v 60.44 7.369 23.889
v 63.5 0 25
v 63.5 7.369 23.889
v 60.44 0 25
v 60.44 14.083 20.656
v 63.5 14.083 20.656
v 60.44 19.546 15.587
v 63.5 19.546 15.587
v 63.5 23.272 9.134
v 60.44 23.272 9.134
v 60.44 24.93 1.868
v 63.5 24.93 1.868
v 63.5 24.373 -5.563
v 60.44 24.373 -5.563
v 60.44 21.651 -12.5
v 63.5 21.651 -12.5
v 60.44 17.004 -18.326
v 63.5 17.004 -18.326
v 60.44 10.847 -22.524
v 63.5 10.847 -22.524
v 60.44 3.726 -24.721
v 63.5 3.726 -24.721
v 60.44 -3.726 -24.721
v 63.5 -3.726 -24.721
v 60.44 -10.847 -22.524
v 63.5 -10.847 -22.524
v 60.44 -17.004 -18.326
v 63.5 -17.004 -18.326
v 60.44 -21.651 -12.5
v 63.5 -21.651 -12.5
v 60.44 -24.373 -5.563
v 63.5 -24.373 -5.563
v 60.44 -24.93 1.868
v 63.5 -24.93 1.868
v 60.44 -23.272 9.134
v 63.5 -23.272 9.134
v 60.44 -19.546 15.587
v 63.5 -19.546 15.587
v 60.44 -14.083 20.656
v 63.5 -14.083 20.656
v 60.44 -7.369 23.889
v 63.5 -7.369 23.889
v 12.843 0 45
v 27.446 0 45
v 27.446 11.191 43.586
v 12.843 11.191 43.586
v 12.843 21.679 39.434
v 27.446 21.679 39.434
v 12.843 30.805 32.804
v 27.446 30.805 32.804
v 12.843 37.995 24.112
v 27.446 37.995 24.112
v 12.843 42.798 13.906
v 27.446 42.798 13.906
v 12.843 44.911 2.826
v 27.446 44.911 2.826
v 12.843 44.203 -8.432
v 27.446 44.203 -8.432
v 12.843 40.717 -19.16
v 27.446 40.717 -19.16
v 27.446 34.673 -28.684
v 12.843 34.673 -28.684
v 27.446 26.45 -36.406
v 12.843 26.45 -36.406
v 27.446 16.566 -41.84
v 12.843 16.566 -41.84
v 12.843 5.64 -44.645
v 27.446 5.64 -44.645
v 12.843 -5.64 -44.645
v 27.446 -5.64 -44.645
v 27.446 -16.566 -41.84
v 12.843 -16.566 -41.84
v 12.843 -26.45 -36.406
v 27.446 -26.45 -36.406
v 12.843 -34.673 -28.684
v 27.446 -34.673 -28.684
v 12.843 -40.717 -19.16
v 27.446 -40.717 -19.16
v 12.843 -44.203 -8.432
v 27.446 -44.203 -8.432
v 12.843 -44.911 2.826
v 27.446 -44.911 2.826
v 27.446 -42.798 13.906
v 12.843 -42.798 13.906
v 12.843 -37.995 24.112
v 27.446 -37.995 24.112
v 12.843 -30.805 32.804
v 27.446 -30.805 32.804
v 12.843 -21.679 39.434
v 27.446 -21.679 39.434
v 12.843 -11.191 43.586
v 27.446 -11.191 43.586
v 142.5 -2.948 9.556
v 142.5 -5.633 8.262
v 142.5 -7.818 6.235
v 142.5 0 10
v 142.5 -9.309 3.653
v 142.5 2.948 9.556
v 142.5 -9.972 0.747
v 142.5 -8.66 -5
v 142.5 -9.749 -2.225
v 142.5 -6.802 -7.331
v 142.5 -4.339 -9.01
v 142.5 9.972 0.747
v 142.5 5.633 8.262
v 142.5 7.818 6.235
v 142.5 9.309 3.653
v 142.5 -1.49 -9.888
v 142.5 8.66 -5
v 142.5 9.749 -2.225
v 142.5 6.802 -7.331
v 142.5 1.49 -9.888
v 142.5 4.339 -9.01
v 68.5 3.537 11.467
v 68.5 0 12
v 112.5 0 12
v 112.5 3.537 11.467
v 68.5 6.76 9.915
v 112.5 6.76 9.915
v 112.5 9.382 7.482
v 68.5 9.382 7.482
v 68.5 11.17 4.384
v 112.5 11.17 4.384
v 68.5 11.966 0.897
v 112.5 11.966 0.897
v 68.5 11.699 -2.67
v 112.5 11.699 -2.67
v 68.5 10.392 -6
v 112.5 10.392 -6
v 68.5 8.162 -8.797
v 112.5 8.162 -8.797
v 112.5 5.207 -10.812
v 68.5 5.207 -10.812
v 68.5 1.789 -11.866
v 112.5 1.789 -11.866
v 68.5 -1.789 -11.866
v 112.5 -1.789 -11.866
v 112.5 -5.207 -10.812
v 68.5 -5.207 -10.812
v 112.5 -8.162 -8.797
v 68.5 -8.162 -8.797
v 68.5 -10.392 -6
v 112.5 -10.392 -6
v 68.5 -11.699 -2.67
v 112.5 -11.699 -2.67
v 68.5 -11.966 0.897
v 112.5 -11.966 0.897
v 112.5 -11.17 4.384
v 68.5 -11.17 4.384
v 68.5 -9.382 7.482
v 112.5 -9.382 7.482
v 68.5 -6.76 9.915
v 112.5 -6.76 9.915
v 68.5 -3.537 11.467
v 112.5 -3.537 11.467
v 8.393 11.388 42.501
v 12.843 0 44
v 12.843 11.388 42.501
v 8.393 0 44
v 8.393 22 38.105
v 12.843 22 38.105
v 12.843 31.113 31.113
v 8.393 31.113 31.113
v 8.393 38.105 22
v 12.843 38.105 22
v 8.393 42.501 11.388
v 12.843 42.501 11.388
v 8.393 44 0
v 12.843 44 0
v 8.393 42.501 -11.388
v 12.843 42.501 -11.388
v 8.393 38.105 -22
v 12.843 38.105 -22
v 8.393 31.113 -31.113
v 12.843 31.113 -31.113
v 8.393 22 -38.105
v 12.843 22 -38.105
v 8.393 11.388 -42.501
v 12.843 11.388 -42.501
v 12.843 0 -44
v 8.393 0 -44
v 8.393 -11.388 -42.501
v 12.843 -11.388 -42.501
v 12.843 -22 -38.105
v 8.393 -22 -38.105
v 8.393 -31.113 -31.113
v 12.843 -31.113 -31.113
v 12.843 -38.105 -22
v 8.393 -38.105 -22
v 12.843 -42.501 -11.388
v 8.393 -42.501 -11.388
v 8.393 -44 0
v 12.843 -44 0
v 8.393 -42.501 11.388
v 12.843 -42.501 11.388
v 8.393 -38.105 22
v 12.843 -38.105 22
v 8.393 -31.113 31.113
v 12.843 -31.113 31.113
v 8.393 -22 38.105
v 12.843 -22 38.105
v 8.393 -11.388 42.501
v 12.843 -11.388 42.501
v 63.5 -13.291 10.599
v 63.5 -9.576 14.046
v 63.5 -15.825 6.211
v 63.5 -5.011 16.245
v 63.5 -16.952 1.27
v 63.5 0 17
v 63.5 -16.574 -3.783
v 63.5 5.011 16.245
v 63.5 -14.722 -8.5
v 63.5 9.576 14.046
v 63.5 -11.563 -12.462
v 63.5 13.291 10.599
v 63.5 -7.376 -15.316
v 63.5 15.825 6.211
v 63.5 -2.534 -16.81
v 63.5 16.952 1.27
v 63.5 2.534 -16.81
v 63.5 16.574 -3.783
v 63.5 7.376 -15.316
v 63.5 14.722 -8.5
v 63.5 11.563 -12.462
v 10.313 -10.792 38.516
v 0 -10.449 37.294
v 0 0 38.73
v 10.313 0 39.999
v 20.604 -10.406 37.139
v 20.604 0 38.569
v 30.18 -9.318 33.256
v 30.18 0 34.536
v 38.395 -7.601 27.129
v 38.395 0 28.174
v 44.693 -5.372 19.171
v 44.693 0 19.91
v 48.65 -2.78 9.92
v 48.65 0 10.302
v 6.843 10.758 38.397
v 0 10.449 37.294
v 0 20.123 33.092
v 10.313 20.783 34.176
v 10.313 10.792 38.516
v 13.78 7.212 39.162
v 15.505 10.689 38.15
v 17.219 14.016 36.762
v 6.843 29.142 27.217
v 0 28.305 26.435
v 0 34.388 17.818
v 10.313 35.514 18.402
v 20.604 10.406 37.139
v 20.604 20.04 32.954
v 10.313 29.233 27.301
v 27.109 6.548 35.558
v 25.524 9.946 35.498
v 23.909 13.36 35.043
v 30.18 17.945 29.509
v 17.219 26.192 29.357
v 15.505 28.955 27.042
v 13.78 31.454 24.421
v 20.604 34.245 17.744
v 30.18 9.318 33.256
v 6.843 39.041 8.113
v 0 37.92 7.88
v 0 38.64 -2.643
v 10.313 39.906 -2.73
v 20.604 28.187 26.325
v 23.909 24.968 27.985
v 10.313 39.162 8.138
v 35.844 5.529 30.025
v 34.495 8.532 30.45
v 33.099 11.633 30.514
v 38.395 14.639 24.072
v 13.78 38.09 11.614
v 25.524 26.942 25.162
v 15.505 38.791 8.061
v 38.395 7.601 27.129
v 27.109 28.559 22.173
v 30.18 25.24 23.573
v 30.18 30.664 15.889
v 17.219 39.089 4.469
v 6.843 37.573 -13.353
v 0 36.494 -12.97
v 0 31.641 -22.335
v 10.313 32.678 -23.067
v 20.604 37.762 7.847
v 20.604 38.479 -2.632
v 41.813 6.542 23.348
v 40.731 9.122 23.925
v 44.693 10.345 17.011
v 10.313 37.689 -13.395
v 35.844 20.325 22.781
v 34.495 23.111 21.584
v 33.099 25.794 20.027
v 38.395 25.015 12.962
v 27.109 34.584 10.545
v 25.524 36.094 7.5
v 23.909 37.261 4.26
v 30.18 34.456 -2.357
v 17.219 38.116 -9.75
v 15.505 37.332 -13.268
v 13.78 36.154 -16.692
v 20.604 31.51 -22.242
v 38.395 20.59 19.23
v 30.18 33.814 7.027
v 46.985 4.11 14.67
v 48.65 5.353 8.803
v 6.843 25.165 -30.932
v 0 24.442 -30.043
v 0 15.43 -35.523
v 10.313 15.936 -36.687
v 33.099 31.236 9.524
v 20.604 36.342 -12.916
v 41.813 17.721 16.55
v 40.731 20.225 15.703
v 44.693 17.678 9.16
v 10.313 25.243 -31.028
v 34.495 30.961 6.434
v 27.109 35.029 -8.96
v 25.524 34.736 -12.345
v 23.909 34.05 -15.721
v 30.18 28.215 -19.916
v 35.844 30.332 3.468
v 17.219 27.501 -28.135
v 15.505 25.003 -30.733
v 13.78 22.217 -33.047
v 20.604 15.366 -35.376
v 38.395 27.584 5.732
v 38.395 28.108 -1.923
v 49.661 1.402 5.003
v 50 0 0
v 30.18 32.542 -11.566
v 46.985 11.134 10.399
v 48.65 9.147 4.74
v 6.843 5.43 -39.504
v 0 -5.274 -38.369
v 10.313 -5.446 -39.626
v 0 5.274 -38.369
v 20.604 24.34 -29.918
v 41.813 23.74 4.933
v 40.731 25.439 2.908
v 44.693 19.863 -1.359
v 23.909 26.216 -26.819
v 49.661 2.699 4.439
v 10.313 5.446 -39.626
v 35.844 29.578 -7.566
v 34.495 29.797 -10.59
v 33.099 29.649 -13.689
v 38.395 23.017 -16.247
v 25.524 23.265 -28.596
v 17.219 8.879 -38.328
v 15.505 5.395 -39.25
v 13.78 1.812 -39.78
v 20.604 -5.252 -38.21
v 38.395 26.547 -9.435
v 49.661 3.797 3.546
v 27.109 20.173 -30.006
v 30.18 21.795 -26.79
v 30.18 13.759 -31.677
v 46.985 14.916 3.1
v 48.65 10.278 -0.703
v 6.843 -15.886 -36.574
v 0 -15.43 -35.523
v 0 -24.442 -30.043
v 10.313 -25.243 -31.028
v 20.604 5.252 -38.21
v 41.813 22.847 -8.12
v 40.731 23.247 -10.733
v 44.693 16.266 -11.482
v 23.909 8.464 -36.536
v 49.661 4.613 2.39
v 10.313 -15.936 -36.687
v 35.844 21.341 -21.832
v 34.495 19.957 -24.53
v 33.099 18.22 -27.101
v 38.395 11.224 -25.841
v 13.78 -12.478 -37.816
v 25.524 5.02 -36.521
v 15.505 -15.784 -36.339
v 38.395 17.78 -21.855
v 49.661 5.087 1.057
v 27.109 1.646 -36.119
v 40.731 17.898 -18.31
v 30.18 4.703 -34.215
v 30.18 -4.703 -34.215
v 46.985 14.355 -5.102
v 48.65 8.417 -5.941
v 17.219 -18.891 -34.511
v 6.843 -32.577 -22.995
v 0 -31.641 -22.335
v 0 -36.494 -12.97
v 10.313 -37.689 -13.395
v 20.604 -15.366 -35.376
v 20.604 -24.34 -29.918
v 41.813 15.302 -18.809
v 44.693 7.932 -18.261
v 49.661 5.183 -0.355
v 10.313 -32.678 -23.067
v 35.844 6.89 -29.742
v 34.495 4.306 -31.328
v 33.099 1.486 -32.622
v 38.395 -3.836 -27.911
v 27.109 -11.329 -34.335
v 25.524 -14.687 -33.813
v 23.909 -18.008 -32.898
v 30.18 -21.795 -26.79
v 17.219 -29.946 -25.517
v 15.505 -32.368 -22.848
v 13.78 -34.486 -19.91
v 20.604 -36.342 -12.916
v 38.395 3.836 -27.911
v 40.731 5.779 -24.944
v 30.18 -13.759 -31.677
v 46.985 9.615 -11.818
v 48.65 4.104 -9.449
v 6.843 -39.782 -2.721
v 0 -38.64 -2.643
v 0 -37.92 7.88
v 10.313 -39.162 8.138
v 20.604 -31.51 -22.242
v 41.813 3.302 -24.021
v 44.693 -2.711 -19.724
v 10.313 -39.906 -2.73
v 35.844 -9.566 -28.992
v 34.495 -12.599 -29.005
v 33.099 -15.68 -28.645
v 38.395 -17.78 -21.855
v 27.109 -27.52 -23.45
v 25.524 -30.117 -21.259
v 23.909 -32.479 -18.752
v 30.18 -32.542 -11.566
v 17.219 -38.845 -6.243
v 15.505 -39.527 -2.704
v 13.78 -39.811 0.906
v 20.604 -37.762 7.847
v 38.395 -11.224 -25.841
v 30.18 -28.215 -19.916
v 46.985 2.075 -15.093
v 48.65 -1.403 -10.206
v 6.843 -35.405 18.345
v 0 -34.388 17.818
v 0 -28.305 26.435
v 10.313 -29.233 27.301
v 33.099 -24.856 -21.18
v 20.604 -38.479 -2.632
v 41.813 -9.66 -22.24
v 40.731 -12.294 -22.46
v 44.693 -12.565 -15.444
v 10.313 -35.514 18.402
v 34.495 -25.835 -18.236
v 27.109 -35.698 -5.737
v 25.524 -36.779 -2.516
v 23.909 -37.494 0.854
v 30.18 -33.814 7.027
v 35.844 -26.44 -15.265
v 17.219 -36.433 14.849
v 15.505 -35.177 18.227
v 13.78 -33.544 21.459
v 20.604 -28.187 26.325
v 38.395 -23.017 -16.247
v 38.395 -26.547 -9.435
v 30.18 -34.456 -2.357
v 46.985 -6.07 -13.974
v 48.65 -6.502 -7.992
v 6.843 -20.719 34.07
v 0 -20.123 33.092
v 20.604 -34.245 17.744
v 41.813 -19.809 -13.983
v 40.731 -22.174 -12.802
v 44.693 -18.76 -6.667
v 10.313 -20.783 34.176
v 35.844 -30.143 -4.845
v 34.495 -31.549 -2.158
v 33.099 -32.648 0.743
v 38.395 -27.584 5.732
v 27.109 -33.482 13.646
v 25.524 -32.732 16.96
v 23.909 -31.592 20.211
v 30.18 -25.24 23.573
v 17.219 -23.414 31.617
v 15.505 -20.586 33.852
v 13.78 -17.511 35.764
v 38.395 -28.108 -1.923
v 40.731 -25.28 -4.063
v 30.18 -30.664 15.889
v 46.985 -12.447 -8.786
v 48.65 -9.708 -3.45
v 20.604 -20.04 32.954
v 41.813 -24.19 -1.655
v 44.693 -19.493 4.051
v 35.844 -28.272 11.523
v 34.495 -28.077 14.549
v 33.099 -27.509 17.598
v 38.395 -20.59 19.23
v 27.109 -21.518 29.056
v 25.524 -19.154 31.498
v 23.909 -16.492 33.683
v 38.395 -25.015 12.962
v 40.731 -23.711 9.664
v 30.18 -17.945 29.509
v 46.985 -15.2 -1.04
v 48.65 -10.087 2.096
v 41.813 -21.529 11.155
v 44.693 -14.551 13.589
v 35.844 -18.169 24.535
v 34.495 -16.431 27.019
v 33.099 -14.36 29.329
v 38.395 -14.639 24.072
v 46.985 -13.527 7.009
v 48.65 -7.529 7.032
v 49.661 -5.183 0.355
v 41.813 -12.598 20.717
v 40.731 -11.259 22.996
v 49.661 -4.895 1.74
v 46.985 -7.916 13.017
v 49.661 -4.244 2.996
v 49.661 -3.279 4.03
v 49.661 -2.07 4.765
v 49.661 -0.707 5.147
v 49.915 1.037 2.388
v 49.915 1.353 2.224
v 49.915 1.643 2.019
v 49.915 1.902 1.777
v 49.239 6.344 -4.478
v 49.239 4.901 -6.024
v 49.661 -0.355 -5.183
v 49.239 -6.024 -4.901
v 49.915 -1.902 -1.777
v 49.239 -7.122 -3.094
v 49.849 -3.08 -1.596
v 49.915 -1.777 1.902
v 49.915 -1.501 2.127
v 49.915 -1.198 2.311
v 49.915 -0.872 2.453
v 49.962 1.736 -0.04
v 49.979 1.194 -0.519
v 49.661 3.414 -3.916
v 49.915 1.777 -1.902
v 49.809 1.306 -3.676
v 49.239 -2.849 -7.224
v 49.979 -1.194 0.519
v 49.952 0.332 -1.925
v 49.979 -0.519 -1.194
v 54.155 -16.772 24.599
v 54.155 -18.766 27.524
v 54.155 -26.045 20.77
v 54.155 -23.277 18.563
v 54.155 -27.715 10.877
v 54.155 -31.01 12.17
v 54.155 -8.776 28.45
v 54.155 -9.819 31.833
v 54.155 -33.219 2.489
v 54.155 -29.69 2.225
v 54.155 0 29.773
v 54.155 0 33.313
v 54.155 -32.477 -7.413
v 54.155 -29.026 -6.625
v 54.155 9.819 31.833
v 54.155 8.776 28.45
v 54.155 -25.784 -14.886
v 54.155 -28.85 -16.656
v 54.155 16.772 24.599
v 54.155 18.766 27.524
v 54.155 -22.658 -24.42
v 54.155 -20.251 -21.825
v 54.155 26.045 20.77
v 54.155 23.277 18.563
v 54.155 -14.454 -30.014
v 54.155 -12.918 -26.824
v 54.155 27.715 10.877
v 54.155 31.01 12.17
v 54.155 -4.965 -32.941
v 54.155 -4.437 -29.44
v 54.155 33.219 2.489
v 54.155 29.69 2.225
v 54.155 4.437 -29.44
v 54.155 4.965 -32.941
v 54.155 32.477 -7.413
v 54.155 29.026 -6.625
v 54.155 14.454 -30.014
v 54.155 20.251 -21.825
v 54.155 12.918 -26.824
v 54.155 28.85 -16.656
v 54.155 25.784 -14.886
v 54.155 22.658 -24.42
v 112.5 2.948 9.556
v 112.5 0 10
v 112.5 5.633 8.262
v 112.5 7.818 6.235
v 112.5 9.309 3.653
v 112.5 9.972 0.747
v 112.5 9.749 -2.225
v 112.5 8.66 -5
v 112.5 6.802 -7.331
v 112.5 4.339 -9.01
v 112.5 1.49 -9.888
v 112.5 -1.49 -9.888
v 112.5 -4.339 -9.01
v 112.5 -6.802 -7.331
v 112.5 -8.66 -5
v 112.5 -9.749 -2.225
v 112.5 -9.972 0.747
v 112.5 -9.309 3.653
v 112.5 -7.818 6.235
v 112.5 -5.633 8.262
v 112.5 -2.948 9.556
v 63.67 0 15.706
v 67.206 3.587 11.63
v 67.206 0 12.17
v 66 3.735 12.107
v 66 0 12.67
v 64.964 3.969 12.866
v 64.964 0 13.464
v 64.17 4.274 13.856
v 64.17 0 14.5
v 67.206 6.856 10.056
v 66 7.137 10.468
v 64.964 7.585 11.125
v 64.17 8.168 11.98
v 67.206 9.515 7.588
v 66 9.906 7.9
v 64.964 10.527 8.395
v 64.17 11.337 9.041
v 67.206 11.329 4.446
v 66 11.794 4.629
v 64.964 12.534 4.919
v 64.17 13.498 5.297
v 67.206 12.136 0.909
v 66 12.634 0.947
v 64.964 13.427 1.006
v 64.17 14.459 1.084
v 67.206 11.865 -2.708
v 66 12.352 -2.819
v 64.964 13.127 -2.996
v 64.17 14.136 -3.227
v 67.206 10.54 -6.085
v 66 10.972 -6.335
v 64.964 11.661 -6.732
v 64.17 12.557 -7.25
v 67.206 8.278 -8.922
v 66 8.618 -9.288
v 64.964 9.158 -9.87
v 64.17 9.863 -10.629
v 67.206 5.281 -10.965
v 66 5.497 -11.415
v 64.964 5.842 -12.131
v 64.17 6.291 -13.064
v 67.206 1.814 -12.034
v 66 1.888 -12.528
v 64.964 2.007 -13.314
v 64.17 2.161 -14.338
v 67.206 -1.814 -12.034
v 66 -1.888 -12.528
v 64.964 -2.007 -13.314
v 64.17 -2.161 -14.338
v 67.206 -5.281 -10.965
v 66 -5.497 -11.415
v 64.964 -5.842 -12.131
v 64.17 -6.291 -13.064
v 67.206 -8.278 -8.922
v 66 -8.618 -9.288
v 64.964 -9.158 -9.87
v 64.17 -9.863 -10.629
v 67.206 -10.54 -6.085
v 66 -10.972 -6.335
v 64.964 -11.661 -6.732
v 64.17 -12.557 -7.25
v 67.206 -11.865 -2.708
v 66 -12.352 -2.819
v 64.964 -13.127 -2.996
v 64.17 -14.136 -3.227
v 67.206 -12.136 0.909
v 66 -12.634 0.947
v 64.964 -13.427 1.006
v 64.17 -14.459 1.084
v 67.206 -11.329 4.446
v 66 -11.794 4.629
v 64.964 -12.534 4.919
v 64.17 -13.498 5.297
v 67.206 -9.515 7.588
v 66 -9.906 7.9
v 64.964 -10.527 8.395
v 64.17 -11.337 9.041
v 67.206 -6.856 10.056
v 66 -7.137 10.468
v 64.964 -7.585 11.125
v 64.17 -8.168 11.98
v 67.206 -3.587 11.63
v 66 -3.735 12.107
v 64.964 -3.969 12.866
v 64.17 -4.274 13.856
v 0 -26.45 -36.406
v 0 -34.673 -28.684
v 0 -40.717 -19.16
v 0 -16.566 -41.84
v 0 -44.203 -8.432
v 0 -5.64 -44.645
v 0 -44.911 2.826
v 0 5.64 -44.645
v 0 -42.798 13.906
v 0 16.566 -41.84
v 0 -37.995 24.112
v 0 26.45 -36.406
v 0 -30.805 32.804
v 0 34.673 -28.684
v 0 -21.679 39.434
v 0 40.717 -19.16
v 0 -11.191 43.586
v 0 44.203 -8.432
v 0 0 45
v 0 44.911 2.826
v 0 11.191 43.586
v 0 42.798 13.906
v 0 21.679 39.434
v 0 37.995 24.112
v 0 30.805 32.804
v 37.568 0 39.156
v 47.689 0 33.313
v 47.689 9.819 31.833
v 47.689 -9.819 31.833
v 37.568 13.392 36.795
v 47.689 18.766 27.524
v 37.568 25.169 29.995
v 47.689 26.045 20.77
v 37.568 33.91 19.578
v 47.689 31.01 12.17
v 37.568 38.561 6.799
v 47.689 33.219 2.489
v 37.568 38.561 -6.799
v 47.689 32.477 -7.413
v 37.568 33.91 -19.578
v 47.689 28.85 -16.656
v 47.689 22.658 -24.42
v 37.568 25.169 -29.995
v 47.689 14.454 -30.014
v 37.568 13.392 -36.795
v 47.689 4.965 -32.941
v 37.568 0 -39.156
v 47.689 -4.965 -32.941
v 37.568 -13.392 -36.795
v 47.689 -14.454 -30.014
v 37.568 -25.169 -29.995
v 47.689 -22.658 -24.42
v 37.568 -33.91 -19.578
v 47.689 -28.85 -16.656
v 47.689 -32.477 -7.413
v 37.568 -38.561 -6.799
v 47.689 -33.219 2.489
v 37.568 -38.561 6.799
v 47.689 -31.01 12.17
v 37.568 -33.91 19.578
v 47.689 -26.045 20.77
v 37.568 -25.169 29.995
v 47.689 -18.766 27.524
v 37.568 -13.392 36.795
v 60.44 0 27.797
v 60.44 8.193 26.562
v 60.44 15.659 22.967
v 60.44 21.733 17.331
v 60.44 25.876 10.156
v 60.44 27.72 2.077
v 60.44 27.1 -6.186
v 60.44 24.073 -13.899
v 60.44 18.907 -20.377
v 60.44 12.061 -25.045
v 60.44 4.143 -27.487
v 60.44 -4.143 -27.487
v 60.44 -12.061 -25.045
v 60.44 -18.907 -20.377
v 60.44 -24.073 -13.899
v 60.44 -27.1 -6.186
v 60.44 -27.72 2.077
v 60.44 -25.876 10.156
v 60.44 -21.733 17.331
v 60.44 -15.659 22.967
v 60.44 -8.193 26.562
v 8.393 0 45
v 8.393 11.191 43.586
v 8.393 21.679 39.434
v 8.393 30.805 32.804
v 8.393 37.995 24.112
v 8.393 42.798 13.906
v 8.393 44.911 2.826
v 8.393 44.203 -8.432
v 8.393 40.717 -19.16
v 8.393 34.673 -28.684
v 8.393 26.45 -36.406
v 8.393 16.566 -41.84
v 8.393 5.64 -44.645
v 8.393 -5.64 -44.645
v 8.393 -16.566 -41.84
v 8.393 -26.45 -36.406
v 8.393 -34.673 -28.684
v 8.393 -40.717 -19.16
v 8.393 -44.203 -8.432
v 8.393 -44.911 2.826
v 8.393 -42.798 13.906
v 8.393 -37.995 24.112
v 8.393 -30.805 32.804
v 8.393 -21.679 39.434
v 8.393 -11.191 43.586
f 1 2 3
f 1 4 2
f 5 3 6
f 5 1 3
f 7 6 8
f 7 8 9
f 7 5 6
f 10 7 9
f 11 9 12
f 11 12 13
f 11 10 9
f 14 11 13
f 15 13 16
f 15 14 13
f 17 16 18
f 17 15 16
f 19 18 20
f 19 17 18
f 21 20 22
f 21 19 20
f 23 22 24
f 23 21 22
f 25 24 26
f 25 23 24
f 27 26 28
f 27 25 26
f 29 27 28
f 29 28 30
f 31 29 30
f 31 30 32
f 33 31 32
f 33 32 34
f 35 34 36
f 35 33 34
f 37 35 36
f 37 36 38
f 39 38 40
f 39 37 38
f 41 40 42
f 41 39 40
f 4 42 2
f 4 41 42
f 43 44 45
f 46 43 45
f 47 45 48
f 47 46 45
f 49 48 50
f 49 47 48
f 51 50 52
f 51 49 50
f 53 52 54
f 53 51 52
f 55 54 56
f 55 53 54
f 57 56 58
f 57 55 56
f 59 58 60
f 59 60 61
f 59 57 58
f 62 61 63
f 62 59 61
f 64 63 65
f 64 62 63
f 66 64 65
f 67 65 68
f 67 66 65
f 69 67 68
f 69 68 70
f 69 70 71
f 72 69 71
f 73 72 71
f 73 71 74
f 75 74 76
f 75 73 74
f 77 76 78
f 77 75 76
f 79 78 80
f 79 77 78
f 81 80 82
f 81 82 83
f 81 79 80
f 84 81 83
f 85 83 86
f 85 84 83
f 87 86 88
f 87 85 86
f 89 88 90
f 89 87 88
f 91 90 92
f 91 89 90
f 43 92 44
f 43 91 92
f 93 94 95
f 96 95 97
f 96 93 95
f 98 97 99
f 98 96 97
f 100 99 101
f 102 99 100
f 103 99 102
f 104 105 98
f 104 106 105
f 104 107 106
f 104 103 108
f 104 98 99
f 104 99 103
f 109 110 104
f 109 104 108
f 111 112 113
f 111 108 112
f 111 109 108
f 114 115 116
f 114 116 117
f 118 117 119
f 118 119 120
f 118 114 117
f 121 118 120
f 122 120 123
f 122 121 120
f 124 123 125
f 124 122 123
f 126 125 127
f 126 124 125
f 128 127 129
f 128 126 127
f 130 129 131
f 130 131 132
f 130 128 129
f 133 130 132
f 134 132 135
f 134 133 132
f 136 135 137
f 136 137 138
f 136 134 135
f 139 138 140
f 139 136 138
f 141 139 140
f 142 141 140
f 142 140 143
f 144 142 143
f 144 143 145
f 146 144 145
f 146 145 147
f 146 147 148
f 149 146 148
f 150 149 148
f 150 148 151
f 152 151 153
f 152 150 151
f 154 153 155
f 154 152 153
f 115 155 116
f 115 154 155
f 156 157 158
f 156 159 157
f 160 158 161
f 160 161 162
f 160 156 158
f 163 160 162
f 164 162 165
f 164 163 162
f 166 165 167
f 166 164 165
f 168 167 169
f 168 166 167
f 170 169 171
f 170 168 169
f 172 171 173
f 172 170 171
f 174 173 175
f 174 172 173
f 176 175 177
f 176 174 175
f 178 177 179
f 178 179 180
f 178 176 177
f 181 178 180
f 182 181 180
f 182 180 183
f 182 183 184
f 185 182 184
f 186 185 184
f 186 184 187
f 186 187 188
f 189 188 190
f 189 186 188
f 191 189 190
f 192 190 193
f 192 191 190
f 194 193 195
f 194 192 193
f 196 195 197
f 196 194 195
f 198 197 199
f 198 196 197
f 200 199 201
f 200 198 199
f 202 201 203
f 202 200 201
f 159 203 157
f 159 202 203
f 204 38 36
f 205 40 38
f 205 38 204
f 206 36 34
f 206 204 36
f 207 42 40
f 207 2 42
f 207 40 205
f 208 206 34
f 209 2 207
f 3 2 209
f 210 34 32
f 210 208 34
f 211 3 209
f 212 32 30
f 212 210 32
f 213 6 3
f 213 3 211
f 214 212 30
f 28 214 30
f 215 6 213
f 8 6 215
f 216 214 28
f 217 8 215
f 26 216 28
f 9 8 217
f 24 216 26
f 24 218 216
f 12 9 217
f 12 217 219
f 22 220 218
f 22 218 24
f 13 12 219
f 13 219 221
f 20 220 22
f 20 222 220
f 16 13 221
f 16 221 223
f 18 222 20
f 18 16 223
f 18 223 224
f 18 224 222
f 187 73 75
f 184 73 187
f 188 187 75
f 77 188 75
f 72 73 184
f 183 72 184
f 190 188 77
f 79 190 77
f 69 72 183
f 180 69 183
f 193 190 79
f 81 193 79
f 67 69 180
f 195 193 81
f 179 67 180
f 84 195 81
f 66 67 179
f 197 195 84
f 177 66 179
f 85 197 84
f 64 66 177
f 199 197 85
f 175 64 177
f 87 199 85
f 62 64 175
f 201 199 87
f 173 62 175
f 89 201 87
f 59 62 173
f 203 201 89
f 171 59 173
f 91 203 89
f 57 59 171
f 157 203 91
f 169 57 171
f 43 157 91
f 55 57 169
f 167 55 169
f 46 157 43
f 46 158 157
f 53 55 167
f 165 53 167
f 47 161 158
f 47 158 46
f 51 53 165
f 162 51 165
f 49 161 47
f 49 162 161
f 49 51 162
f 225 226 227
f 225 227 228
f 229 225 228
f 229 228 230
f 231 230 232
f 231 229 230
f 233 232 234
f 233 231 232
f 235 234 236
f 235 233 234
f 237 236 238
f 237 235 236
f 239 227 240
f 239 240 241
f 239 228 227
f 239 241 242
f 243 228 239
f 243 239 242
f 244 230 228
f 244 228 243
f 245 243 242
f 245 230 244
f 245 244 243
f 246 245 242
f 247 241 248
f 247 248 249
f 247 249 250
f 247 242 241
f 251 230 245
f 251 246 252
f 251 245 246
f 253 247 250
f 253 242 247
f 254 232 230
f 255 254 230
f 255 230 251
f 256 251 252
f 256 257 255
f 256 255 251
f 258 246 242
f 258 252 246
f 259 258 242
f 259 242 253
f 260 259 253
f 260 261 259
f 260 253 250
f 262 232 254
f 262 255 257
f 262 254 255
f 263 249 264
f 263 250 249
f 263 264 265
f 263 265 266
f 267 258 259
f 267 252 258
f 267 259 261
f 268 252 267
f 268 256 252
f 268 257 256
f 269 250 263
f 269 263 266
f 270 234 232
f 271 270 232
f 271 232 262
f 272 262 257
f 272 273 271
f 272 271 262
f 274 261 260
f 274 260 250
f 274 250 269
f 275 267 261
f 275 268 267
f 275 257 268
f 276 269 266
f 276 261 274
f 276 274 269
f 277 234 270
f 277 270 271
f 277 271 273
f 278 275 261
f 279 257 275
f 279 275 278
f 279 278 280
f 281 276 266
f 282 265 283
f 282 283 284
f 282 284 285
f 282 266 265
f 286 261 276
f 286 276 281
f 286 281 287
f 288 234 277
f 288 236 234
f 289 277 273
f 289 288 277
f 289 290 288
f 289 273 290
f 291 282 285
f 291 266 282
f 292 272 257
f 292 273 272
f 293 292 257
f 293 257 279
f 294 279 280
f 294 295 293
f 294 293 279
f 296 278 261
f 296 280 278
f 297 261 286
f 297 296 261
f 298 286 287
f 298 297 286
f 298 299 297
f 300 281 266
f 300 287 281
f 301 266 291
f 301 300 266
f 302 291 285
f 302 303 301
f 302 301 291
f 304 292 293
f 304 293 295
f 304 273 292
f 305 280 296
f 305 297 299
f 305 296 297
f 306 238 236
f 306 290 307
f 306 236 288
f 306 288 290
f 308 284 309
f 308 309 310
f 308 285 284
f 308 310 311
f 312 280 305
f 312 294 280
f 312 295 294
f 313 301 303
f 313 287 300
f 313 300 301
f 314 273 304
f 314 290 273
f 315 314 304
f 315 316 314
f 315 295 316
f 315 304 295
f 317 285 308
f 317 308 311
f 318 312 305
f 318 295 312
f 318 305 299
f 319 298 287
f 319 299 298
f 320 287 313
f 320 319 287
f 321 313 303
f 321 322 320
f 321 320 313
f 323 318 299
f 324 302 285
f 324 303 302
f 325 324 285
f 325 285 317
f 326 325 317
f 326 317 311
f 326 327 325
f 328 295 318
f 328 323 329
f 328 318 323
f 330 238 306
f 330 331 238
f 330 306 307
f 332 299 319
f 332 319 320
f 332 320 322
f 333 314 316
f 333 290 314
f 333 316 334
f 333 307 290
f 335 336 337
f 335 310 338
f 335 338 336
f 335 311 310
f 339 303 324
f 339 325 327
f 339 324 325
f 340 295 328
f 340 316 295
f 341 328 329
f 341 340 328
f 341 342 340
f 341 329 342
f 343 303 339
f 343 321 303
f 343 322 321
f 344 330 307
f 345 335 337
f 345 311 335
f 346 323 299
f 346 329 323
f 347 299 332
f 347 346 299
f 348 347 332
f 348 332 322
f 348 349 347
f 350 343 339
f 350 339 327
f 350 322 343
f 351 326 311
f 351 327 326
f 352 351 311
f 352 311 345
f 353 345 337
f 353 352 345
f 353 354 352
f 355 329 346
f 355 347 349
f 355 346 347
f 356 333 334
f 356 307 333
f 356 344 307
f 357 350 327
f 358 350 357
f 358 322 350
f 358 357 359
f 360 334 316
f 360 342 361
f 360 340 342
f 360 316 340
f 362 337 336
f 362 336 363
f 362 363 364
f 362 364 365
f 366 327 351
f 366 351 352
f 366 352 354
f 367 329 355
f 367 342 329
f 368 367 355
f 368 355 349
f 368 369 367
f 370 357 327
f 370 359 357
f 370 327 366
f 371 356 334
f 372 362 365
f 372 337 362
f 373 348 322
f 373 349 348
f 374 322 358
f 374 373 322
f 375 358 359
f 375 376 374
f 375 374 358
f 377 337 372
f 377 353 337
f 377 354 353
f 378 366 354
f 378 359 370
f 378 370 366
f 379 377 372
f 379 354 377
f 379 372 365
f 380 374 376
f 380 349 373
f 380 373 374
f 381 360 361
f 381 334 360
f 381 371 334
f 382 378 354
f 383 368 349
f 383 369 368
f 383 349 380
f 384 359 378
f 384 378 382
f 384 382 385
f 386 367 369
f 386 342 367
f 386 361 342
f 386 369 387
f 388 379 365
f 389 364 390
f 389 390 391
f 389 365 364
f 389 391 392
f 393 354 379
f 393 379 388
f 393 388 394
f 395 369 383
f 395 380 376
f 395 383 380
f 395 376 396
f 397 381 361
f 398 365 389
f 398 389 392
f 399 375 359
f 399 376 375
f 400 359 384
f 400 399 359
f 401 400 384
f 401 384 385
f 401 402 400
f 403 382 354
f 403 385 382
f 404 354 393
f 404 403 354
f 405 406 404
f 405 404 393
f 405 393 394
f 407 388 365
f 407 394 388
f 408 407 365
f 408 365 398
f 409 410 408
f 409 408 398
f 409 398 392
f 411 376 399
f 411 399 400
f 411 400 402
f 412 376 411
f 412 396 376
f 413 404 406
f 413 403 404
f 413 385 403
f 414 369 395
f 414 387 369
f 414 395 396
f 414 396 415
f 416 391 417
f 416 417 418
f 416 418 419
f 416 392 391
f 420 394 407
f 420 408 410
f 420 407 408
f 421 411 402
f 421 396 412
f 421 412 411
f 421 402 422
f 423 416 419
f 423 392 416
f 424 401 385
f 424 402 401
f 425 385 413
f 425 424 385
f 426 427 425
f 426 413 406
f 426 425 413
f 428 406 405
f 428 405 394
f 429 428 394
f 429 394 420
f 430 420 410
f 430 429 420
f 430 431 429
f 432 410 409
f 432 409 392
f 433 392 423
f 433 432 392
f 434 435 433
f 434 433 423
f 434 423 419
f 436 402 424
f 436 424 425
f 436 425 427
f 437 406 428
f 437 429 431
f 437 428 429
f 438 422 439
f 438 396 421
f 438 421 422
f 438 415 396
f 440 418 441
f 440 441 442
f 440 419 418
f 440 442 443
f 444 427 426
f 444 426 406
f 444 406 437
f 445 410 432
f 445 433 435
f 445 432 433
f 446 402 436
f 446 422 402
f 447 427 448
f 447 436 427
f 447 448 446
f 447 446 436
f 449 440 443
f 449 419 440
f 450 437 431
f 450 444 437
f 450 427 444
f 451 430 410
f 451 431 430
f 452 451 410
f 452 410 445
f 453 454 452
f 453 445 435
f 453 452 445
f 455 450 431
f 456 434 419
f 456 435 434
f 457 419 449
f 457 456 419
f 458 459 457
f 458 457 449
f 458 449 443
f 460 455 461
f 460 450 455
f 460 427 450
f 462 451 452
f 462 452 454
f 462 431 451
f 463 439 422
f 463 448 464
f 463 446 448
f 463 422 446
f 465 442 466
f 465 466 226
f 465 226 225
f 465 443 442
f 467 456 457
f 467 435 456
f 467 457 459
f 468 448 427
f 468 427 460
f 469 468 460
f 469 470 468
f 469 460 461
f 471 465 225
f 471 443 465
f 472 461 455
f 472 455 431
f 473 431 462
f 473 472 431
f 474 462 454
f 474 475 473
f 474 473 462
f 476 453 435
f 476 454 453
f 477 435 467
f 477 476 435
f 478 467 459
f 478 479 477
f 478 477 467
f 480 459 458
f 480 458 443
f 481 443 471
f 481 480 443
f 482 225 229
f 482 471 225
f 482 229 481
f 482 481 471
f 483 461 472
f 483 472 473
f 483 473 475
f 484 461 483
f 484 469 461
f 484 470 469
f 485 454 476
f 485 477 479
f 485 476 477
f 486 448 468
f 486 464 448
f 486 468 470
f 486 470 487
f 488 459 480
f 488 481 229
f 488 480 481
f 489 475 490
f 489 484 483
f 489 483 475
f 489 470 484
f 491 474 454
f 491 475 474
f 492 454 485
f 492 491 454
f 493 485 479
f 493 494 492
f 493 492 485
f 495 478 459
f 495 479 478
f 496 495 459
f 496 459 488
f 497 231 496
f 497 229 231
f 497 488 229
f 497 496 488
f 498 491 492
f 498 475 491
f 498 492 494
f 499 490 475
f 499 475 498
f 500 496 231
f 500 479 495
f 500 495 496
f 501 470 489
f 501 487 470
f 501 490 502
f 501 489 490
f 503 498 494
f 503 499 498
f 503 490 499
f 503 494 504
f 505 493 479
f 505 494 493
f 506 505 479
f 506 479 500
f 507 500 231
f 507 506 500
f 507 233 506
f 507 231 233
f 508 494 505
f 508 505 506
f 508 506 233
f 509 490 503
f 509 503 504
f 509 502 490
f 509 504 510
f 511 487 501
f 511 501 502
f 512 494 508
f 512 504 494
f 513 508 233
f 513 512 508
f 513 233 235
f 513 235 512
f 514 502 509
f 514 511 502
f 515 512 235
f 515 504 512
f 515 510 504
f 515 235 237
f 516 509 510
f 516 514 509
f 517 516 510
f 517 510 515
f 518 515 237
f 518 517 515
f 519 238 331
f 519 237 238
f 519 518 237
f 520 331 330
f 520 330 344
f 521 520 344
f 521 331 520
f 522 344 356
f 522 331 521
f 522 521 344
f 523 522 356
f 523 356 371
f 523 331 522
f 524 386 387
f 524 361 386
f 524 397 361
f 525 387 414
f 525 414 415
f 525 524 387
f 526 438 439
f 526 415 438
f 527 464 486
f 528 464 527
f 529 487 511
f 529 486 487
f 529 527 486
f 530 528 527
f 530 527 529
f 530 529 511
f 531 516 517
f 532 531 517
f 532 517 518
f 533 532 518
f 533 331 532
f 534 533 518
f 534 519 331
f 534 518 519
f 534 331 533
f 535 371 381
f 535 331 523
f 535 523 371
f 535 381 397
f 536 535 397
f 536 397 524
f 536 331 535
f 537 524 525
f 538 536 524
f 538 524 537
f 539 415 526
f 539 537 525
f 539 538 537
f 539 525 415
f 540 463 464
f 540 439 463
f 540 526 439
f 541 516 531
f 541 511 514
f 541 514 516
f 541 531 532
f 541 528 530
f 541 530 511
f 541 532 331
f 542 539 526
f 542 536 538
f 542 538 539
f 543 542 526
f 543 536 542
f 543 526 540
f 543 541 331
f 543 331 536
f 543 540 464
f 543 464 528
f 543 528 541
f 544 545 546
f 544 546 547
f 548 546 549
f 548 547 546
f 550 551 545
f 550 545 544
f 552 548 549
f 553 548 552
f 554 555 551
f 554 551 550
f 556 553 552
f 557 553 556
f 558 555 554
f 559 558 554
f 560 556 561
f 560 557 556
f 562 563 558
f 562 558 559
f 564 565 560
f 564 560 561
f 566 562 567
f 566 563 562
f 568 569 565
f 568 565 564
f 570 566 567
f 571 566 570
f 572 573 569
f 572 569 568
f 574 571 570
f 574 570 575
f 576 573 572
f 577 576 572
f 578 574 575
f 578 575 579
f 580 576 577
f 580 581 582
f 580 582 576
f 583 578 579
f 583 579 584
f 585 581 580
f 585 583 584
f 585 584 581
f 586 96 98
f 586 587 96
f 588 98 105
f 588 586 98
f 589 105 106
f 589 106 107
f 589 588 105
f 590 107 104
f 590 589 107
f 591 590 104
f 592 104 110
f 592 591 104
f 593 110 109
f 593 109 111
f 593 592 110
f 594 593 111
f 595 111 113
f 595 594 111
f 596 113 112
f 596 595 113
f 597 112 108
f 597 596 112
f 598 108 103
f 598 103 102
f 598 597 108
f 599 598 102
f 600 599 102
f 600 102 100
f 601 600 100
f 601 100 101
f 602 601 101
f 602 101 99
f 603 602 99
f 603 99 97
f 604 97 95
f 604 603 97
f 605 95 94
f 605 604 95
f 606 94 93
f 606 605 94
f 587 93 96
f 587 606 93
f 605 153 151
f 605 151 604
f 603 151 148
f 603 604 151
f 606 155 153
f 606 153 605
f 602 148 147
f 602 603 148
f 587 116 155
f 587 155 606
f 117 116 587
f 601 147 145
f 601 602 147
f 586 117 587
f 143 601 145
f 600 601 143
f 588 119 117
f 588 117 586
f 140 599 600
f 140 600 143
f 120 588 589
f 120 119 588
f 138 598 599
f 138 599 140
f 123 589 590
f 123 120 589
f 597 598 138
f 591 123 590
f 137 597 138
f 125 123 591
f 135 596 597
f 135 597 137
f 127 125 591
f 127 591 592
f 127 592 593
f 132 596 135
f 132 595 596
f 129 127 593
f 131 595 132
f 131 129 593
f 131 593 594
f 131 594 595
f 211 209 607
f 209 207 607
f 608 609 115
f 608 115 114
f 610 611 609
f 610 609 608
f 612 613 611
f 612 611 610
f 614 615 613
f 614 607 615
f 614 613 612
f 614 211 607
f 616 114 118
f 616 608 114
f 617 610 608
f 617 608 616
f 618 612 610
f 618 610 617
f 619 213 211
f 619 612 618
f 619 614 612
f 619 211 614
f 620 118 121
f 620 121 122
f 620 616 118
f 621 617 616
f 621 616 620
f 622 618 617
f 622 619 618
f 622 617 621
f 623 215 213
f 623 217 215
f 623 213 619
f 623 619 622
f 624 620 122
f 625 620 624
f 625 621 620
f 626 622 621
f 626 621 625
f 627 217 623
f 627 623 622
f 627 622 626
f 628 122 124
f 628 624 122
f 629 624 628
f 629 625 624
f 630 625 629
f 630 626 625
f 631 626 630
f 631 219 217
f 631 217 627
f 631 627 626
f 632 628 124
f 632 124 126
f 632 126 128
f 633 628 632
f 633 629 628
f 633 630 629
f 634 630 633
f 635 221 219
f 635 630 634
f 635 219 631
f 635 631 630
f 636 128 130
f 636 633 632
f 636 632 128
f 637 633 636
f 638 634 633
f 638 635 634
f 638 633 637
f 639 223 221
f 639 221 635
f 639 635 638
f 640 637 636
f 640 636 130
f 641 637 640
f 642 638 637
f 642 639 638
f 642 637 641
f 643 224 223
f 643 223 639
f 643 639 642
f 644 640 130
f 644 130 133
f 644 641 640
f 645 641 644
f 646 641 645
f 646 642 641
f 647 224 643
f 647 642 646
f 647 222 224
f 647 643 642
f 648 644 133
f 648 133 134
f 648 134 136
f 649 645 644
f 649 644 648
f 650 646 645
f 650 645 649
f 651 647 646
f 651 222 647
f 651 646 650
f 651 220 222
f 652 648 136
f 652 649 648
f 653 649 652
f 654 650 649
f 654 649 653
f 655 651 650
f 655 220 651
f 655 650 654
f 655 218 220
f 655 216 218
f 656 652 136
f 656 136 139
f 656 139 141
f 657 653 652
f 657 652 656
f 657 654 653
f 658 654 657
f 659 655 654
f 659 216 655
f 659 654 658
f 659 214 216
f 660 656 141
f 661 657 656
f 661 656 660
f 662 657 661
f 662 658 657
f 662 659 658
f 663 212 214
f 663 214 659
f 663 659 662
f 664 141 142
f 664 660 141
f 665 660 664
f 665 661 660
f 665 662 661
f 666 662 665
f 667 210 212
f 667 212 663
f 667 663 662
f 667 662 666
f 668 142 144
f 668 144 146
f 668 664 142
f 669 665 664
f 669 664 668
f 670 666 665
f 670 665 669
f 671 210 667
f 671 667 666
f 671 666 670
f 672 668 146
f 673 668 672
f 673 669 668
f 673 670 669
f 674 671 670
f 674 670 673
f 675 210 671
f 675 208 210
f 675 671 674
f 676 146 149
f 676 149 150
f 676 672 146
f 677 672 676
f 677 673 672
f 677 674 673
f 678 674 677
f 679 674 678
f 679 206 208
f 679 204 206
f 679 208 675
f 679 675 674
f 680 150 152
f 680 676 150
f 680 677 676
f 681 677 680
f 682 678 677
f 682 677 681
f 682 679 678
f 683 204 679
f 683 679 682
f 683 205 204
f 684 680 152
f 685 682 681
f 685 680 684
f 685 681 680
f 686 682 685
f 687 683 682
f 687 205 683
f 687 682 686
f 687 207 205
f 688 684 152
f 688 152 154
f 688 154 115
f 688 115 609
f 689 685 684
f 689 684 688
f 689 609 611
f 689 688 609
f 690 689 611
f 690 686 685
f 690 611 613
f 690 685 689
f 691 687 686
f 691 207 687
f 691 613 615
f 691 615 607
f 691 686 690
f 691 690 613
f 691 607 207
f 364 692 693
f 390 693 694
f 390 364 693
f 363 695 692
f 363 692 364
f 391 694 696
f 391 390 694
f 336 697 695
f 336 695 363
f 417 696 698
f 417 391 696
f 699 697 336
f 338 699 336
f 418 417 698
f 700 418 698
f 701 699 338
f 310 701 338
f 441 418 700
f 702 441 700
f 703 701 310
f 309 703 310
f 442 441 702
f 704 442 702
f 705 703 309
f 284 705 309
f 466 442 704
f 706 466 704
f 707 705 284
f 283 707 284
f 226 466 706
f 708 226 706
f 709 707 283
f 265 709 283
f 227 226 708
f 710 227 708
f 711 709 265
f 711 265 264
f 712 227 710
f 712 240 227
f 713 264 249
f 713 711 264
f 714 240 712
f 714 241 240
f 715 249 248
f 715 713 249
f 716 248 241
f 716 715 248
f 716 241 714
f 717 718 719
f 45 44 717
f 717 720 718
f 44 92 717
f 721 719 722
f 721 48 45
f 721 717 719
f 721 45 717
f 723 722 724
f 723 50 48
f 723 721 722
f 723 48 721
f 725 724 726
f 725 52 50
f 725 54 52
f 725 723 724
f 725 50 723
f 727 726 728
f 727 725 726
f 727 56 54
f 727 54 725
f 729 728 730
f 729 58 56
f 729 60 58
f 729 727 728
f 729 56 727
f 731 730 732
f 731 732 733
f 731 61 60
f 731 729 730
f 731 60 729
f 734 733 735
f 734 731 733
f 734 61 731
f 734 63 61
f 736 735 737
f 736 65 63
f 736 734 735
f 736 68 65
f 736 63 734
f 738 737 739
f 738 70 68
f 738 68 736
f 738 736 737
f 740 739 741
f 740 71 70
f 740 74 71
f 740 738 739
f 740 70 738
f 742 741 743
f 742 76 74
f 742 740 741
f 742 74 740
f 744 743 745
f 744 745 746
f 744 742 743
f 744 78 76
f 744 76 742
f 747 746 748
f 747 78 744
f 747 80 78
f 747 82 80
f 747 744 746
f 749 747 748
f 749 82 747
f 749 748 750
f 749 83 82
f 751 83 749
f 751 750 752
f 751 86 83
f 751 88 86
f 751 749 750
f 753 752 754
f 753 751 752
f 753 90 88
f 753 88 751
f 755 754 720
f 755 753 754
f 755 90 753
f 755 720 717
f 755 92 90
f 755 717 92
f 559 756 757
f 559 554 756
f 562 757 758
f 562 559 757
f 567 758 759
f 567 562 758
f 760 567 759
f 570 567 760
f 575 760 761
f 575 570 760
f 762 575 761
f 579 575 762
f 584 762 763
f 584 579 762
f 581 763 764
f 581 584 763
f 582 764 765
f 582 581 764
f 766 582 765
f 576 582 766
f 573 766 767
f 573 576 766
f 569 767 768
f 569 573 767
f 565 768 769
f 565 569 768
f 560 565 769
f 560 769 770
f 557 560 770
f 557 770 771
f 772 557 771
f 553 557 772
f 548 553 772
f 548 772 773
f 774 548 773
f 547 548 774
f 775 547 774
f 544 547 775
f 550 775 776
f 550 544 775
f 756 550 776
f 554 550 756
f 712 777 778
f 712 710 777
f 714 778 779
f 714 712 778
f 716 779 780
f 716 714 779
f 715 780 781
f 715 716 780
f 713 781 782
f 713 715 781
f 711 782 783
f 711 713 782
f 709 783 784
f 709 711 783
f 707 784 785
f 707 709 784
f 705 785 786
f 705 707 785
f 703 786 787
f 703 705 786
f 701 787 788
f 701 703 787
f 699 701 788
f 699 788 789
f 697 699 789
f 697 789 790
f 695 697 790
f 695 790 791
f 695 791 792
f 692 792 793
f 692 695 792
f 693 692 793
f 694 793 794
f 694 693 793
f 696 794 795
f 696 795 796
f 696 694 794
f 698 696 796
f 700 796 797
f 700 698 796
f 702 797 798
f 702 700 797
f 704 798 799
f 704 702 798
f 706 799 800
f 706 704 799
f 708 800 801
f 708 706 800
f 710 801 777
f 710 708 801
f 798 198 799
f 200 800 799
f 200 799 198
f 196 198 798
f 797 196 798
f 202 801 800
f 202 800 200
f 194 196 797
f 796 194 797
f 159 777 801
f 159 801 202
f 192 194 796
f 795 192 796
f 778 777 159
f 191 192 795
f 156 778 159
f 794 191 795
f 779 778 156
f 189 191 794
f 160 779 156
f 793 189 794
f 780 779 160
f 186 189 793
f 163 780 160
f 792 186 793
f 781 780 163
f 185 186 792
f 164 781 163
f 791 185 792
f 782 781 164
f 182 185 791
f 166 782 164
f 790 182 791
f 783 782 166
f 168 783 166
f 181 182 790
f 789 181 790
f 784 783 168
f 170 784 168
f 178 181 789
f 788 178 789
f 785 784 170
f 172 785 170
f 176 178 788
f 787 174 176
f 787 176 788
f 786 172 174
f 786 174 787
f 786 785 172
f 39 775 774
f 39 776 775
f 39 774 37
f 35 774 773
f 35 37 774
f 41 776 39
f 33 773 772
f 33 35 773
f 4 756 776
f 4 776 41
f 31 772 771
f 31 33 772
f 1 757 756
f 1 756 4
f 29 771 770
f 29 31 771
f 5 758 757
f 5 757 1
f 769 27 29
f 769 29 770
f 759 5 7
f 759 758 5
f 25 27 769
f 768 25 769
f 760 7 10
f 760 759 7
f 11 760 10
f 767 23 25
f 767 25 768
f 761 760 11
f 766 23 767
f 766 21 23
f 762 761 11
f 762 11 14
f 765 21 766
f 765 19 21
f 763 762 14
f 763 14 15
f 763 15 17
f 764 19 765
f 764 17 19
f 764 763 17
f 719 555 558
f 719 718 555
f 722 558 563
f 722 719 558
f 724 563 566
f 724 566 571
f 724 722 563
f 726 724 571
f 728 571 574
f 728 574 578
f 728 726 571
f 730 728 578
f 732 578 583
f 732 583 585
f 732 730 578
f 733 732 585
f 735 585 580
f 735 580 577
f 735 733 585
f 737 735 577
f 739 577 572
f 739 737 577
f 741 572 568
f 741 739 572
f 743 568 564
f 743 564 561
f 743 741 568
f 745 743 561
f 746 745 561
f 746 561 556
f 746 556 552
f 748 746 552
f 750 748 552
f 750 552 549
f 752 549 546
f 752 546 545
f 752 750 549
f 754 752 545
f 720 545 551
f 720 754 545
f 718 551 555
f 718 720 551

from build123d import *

# Parameters (mm, degrees)
F2_R = 5


with BuildPart() as f1:
    # F0 (on Front) → F1 (revolve)
    with BuildSketch(Plane.XZ):
        with BuildLine():
            Line((8.393259, 45), (0, 45))
            Line((0, 45), (0, 38.729833))
            ThreePointArc((0, 38.729833), (34.494897, 31.622777), (50, 0))
            Line((50, 0), (142.5, 0))
            Line((142.5, 0), (142.5, 10))
            Line((142.5, 10), (112.5, 10))
            Line((112.5, 10), (112.5, 12))
            Line((112.5, 12), (63.5, 12))
            Line((63.5, 12), (63.5, 25))
            Line((63.5, 25), (60.439724, 25))
            Line((60.439724, 25), (60.439724, 27.797434))
            Line((60.439724, 27.797434), (54.154508, 29.772789))
            Line((54.154508, 29.772789), (54.154508, 33.31258))
            Line((54.154508, 33.31258), (47.689248, 33.31258))
            Line((47.689248, 33.31258), (27.446042, 45))
            Line((27.446042, 45), (12.842697, 45))
            Line((12.842697, 45), (12.842697, 44))
            Line((12.842697, 44), (8.393259, 44))
            Line((8.393259, 44), (8.393259, 45))
        make_face()
    revolve(axis=Axis((96.25, 0, 0), (-1, 0, 0)))

    # F2
    f2_edges = [f1.edges().sort_by_distance(p)[0] for p in [
        (63.5, 0, -12),
    ]]
    fillet(f2_edges, radius=F2_R)


solid = f1.part
